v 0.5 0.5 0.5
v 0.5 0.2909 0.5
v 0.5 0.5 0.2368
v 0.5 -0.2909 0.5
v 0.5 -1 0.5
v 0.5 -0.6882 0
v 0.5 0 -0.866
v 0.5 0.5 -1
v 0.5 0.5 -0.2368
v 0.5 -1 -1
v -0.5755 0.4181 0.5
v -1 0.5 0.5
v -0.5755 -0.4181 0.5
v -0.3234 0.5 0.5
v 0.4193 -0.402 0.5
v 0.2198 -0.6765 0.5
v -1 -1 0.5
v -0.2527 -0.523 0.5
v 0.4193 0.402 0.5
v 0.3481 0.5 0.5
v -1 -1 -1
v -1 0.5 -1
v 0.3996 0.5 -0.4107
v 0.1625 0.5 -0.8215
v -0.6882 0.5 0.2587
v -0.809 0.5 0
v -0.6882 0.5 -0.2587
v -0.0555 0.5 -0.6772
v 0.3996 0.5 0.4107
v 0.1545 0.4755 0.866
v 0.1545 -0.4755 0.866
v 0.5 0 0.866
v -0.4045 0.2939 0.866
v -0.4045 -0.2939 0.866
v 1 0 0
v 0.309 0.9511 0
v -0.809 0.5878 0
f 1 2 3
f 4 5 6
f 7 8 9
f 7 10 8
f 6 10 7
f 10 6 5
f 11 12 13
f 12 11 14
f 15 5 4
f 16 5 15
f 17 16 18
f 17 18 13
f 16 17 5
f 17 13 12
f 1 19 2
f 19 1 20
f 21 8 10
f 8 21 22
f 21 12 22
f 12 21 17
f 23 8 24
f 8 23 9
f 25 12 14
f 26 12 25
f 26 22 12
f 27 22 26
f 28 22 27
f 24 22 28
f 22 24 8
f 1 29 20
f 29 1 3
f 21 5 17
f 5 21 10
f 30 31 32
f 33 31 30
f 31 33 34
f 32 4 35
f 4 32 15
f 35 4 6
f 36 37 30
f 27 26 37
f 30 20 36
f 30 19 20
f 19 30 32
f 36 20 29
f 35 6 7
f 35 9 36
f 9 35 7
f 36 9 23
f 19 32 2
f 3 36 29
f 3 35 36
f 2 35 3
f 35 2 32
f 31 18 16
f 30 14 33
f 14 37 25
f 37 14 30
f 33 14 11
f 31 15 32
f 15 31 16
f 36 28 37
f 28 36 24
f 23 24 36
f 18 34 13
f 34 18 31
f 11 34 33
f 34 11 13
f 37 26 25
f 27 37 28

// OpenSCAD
union(){
    color("#c758d8")
     translate([-1,-1,-1])
        cube([1.5,1.5,1.5]);
    //translate([1,1,1])
    color("blue")
     sphere();
}
